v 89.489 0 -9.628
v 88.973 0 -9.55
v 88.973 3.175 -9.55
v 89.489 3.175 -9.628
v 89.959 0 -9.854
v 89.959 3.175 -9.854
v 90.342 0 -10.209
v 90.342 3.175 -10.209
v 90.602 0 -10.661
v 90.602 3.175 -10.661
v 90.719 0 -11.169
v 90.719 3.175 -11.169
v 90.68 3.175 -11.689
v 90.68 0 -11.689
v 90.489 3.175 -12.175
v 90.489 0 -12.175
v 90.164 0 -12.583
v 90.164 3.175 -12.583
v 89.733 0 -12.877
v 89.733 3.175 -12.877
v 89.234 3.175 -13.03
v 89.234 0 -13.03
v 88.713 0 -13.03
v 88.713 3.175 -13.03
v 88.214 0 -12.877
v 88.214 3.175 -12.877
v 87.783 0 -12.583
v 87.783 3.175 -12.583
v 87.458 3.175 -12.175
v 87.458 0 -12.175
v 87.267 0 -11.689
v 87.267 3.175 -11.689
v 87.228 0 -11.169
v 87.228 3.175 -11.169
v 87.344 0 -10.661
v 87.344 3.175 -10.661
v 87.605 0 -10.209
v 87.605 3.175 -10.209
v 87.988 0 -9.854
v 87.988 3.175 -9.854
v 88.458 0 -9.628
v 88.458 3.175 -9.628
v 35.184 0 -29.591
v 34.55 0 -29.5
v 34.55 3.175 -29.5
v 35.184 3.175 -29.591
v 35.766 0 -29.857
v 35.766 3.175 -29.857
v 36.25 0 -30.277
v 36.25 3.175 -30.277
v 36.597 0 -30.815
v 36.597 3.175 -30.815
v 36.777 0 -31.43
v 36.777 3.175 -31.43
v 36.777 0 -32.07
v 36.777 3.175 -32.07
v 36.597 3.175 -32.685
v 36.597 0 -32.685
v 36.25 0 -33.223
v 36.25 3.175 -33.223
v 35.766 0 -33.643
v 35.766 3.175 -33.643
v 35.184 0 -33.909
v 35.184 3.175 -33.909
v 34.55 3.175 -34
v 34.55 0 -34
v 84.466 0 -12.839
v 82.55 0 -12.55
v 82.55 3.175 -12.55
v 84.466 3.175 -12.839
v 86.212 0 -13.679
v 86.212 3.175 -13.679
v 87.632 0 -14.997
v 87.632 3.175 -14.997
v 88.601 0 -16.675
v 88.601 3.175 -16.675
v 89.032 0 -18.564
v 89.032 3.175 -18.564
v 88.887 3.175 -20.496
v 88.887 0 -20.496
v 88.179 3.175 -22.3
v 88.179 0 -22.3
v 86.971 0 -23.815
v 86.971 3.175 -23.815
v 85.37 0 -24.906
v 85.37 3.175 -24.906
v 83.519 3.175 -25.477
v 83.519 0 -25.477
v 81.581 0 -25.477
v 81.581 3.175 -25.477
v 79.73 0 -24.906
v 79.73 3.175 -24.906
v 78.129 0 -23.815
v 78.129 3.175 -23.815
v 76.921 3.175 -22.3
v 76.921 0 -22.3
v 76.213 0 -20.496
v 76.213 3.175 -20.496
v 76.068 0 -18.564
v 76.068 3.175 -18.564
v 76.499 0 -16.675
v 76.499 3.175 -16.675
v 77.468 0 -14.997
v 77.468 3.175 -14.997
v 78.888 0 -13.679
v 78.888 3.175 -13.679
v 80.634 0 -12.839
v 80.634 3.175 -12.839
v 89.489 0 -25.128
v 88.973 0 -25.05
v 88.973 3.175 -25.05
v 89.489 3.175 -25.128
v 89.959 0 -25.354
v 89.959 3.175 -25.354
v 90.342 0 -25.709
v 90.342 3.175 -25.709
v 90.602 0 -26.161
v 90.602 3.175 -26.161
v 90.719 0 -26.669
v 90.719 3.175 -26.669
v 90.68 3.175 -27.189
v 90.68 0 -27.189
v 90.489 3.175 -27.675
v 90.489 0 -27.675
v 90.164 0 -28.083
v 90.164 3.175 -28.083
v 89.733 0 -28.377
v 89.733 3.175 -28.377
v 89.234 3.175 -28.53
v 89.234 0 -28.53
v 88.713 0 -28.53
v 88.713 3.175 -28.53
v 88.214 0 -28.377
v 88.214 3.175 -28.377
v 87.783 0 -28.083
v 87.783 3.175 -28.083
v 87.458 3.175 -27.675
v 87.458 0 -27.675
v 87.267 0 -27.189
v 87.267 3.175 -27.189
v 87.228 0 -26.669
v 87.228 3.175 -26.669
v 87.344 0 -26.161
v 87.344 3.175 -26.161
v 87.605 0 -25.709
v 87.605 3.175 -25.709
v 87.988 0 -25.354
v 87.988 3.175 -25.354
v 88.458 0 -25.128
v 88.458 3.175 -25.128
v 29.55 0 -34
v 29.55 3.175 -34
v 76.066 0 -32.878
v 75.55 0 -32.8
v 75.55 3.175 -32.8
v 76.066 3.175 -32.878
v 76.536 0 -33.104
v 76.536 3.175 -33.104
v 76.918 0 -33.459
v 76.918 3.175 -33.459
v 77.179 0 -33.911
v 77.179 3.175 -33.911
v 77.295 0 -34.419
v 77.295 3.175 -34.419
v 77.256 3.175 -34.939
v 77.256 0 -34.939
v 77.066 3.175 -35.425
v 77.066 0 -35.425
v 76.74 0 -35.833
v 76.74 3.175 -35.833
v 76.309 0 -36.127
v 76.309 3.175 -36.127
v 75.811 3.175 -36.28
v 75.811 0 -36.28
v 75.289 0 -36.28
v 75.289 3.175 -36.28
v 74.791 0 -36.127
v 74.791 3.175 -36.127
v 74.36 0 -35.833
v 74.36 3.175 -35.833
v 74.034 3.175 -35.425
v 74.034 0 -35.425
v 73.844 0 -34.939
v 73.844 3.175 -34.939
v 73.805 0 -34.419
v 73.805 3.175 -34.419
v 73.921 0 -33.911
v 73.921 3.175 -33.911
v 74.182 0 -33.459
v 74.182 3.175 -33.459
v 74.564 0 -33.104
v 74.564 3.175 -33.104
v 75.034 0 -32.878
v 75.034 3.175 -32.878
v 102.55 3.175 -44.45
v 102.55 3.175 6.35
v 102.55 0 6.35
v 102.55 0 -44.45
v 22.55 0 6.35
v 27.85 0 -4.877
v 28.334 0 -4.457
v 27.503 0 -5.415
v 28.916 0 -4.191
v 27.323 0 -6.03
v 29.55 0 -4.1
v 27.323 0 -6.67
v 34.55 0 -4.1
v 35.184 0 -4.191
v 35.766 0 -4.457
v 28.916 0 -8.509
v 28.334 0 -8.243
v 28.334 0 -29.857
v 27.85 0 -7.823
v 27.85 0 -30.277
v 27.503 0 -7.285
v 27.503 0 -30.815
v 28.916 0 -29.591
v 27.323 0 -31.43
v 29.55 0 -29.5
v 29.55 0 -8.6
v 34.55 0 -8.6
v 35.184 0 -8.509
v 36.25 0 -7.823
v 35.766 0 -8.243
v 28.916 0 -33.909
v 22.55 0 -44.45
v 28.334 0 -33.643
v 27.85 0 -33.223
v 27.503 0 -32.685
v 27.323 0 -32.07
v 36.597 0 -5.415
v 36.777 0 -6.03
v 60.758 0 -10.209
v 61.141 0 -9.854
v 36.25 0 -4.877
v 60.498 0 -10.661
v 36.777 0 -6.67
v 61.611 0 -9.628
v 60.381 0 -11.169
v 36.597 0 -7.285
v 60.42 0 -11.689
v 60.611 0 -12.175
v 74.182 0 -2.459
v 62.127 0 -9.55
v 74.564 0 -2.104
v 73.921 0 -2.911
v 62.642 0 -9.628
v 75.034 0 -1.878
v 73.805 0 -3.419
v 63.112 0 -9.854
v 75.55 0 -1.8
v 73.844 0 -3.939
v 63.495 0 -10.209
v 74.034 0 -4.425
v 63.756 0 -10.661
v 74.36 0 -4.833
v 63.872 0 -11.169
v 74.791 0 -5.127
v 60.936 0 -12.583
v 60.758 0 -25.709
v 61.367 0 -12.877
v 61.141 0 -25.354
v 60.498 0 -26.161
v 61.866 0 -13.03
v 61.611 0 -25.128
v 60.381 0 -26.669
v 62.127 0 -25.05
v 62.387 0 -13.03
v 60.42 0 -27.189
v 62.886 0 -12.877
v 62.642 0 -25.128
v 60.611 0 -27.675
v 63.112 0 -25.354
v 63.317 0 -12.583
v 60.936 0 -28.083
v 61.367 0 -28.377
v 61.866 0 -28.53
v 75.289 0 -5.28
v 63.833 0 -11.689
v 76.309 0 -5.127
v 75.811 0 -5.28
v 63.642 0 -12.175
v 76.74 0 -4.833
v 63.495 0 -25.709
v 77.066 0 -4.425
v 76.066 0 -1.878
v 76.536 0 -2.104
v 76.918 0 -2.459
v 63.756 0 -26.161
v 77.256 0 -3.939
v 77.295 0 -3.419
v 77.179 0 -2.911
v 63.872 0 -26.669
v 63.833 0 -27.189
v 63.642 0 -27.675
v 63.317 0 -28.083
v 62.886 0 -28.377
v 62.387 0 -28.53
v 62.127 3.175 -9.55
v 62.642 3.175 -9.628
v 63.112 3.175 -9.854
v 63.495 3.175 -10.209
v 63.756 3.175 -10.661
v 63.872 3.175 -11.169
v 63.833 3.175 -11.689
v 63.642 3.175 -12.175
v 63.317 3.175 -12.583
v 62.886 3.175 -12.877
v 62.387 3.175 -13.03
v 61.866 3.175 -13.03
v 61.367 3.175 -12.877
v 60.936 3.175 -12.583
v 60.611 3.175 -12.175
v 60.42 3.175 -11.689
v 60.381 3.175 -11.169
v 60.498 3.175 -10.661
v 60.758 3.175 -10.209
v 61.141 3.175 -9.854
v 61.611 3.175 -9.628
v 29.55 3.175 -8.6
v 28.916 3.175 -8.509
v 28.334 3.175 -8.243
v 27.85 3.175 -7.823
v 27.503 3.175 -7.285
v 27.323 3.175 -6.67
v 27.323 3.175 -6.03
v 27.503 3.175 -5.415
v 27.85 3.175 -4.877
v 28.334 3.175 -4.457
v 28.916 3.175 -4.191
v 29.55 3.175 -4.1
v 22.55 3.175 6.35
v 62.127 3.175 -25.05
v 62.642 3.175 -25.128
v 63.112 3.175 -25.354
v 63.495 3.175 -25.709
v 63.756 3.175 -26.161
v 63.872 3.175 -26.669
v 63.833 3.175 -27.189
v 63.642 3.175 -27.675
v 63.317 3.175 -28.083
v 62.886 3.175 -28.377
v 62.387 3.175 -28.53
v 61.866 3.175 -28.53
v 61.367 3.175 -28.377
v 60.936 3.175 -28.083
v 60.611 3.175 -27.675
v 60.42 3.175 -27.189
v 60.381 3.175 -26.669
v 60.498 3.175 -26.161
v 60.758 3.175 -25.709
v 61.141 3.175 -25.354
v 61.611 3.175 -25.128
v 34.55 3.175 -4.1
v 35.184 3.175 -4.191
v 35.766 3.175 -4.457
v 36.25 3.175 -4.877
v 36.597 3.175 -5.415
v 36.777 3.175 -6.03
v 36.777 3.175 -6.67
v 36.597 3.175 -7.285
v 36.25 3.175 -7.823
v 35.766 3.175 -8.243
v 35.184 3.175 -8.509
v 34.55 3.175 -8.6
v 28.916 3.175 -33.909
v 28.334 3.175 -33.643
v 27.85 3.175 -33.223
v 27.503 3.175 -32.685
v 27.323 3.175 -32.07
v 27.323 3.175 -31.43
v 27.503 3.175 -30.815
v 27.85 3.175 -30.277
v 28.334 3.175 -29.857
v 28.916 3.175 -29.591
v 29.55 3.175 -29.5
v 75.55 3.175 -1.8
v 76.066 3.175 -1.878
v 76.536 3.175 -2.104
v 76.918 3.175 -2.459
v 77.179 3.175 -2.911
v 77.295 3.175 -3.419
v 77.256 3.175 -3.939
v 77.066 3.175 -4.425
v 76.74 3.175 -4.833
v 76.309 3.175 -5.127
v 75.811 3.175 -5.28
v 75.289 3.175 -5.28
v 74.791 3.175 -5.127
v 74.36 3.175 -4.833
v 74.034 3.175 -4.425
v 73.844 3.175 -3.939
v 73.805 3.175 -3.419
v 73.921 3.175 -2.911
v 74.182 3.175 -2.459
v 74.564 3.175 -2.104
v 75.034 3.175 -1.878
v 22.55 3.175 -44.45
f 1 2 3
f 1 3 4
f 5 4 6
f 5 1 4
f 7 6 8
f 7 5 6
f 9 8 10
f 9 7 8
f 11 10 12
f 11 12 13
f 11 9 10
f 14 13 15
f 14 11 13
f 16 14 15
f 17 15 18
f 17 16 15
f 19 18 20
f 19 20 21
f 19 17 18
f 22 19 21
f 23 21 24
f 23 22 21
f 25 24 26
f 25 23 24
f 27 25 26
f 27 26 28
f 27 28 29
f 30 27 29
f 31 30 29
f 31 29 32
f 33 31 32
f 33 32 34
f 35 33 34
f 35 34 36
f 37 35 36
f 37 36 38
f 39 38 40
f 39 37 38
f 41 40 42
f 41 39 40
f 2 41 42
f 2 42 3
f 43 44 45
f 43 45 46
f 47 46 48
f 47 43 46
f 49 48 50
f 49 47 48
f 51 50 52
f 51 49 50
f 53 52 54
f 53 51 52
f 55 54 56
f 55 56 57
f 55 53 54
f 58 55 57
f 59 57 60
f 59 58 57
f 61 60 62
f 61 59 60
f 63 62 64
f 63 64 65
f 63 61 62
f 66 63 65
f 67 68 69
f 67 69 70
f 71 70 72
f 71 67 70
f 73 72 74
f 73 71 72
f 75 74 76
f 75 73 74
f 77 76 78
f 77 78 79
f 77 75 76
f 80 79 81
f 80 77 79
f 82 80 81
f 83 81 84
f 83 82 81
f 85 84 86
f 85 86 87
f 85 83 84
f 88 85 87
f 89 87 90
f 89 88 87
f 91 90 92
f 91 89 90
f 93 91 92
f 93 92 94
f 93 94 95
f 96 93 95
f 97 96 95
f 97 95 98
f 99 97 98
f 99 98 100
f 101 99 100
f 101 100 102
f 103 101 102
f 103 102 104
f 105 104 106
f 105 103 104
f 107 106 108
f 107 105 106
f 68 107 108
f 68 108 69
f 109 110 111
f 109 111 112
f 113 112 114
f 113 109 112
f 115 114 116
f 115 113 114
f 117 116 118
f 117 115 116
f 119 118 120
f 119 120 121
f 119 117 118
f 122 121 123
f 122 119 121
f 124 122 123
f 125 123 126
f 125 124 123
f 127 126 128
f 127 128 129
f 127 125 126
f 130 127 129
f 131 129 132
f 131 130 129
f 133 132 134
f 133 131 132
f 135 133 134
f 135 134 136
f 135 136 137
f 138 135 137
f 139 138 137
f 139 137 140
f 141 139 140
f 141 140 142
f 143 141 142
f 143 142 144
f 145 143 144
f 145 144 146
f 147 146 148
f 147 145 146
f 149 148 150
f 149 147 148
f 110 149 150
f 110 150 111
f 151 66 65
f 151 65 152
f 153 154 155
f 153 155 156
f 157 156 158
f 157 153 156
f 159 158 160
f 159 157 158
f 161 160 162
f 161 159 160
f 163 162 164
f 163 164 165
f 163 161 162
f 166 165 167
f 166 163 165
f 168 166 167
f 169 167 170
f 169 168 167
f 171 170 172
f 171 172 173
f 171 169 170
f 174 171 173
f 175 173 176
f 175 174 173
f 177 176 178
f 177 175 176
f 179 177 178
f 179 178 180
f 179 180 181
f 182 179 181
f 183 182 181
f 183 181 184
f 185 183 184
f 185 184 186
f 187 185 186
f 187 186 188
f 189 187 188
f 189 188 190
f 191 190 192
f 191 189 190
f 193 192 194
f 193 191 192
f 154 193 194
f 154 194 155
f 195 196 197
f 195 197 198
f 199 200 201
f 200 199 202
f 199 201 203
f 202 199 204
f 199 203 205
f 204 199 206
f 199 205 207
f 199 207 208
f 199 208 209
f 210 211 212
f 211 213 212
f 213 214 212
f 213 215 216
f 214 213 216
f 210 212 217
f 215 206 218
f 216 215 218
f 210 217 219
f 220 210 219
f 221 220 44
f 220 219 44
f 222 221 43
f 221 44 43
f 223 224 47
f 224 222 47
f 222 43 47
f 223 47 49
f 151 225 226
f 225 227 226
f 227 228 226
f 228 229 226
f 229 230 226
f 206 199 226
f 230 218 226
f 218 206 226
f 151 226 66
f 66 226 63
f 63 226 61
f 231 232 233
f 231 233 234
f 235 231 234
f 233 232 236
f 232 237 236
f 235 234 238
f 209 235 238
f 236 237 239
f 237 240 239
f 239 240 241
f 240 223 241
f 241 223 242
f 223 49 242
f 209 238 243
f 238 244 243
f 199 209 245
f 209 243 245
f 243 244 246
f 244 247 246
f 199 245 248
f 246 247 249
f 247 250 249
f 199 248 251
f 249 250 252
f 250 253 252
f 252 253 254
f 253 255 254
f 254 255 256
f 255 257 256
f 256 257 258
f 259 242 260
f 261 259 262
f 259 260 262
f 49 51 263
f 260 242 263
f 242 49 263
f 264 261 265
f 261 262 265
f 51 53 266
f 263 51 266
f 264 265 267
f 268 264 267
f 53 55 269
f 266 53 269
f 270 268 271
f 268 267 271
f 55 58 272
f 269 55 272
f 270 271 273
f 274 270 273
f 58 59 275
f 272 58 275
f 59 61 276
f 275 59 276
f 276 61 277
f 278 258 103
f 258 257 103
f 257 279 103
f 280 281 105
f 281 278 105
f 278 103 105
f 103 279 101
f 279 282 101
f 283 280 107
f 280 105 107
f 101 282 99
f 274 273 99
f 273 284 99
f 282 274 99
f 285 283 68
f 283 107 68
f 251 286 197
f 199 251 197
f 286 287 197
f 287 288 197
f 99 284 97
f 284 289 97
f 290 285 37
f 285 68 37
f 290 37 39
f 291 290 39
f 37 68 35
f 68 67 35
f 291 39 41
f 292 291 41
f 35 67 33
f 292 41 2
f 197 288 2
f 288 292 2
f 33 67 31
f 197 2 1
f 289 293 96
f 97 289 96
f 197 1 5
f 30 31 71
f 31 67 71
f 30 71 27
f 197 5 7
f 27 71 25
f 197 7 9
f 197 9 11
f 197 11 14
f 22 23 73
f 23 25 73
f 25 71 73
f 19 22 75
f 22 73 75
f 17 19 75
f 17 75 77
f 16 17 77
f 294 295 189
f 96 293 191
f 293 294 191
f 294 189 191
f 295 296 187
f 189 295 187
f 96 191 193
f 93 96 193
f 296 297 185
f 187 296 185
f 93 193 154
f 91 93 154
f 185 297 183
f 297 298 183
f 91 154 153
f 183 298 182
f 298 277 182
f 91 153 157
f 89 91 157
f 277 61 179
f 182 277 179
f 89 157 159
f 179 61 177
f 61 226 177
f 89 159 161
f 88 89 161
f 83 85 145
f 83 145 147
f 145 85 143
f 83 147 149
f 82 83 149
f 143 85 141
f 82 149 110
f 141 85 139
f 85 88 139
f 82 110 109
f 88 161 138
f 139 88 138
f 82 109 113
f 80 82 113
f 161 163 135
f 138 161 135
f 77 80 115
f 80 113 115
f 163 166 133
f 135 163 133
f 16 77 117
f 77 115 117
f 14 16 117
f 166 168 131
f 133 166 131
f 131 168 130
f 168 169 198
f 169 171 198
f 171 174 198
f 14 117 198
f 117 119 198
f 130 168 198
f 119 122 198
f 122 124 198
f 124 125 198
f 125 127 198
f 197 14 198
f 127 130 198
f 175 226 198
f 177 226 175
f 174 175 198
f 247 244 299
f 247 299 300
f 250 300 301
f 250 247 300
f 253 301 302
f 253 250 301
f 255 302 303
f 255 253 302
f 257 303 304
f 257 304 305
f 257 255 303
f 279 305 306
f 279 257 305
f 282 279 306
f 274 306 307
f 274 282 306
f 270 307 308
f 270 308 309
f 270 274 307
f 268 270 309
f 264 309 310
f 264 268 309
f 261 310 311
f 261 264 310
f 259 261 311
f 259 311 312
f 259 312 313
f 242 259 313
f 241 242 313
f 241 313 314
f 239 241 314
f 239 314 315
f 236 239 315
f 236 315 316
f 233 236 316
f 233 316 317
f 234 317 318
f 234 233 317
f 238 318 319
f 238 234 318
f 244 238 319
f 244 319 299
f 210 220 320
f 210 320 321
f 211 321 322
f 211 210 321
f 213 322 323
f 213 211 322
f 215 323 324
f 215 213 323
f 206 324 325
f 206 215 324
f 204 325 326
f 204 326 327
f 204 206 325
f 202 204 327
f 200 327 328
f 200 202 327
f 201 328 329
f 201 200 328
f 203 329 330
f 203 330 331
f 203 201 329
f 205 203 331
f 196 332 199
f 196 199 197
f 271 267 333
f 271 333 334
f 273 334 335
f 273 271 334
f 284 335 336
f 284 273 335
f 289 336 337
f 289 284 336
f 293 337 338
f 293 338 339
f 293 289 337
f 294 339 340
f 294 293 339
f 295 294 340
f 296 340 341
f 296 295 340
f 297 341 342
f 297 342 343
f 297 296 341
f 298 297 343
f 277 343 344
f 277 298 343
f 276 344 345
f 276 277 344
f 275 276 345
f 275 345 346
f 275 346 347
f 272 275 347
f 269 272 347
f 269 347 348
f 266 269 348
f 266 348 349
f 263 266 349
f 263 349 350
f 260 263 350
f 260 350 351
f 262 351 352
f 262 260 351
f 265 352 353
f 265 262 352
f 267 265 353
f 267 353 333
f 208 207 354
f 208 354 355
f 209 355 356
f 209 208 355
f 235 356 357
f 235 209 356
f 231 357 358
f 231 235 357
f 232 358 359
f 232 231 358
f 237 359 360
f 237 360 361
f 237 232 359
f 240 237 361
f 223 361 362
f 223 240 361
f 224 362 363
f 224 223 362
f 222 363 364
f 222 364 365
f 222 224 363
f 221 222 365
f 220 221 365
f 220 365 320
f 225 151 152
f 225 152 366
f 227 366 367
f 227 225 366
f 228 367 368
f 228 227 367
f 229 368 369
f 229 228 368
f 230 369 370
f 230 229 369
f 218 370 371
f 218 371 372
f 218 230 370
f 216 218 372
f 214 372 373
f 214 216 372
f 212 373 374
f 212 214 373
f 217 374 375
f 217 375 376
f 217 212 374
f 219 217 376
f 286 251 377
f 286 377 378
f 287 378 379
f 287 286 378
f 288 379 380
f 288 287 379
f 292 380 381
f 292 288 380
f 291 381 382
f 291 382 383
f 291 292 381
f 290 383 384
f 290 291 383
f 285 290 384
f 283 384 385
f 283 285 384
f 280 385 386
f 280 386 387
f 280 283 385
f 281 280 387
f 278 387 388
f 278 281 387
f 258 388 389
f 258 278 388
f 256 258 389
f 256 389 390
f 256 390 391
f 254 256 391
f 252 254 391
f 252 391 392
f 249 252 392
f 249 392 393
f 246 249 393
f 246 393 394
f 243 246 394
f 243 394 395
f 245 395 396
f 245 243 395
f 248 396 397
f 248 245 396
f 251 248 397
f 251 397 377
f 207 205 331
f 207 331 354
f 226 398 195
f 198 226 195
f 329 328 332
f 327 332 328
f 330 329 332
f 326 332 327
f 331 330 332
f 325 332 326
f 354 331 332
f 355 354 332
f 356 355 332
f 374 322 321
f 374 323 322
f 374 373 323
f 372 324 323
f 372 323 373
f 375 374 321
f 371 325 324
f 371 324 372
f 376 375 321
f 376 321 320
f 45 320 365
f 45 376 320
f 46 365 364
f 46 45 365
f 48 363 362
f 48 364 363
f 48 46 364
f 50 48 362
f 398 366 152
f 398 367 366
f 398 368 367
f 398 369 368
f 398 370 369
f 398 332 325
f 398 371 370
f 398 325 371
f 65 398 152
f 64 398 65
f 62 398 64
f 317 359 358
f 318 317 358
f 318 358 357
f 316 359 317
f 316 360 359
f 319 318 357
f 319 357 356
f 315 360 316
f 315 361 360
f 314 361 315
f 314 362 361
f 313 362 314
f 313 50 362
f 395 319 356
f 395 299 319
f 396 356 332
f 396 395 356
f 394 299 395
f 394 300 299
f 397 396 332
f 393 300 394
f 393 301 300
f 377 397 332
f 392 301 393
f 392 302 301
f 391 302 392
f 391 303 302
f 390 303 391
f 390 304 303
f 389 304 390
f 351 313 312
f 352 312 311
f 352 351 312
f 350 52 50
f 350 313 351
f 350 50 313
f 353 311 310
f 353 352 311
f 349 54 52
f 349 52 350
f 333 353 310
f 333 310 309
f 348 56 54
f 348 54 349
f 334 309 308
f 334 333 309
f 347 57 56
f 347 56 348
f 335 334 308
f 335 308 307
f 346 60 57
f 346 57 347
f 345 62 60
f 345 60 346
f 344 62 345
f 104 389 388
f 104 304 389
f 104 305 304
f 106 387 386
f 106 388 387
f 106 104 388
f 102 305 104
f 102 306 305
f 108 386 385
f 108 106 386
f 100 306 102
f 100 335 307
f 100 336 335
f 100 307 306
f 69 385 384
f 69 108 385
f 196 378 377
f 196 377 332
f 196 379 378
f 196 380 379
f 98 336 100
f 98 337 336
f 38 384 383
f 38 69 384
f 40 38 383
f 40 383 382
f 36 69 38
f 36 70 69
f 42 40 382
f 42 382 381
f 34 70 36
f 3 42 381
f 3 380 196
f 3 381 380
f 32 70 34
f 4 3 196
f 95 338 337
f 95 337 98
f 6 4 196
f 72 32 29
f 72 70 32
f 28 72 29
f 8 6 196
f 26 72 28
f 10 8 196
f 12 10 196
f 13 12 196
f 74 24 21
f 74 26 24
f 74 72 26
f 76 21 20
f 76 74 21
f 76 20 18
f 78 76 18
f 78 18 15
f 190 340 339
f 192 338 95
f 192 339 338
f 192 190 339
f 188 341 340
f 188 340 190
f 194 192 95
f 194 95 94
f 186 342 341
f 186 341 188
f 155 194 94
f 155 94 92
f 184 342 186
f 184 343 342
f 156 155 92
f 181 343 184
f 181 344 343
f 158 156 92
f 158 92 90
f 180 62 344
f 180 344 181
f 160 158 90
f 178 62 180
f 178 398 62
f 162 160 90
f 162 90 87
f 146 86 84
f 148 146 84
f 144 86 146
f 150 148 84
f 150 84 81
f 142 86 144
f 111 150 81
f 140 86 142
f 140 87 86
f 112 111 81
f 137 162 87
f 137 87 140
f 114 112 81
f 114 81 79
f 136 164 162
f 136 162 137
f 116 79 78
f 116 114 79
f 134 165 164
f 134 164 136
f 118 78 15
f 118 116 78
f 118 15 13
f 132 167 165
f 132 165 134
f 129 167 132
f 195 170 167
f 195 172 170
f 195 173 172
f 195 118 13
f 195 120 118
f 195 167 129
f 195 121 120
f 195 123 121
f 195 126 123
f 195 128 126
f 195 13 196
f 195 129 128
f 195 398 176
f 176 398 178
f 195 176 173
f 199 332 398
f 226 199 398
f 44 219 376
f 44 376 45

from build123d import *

# Parameters (mm, degrees)
SKETCH1_W           = 80
SKETCH1_H           = 38.1
SKETCH1_R           = 6.5
SKETCH1_R_2         = 1.75
BOSS_EXTRUDE1_DEPTH = 3.175
SKETCH2_W           = 80
SKETCH2_H           = 6.35
BOSS_EXTRUDE2_DEPTH = 3.175


with BuildPart() as part:
    # Sketch1 → Boss-Extrude1 (new body)
    with BuildSketch(Plane(origin=(0, 0, 0), x_dir=(1, 0, 0), z_dir=(0, 1, 0))):
        with Locations((62.55, 19.05)):
            Rectangle(SKETCH1_W, SKETCH1_H)
        with Locations(Location((82.55, 19.05, 0), (0, 0, 270))):
            Circle(SKETCH1_R, mode=Mode.SUBTRACT)
        with Locations(Location((75.55, 34.55, 0), (0, 0, 270))):
            Circle(SKETCH1_R_2, mode=Mode.SUBTRACT)
        with Locations(Location((88.973393759, 26.8, 0), (0, 0, 270))):
            Circle(SKETCH1_R_2, mode=Mode.SUBTRACT)
        with Locations(Location((88.973393759, 11.3, 0), (0, 0, 270))):
            Circle(SKETCH1_R_2, mode=Mode.SUBTRACT)
        with Locations(Location((75.55, 3.55, 0), (0, 0, 270))):
            Circle(SKETCH1_R_2, mode=Mode.SUBTRACT)
        with Locations(Location((62.126606241, 11.3, 0), (0, 0, 270))):
            Circle(SKETCH1_R_2, mode=Mode.SUBTRACT)
        with Locations(Location((62.126606241, 26.8, 0), (0, 0, 270))):
            Circle(SKETCH1_R_2, mode=Mode.SUBTRACT)
        with BuildLine():
            Line((29.55, 29.5), (34.55, 29.5))
            ThreePointArc((34.55, 29.5), (36.8, 31.75), (34.55, 34))
            Line((34.55, 34), (29.55, 34))
            ThreePointArc((29.55, 34), (27.3, 31.75), (29.55, 29.5))
        make_face(mode=Mode.SUBTRACT)
        with BuildLine():
            Line((29.55, 4.1), (34.55, 4.1))
            ThreePointArc((34.55, 4.1), (36.8, 6.35), (34.55, 8.6))
            Line((34.55, 8.6), (29.55, 8.6))
            ThreePointArc((29.55, 8.6), (27.3, 6.35), (29.55, 4.1))
        make_face(mode=Mode.SUBTRACT)
    extrude(amount=BOSS_EXTRUDE1_DEPTH)

    # Sketch2 → Boss-Extrude2 (add)
    with BuildSketch(Plane(origin=(0, 3.175, 0), x_dir=(1, 0, 0), z_dir=(0, 1, 0))):
        with Locations((62.55, 41.275)):
            Rectangle(SKETCH2_W, SKETCH2_H)
        with Locations((62.55, -3.175)):
            Rectangle(SKETCH2_W, SKETCH2_H)
    extrude(amount=-BOSS_EXTRUDE2_DEPTH)


solid = part.part
